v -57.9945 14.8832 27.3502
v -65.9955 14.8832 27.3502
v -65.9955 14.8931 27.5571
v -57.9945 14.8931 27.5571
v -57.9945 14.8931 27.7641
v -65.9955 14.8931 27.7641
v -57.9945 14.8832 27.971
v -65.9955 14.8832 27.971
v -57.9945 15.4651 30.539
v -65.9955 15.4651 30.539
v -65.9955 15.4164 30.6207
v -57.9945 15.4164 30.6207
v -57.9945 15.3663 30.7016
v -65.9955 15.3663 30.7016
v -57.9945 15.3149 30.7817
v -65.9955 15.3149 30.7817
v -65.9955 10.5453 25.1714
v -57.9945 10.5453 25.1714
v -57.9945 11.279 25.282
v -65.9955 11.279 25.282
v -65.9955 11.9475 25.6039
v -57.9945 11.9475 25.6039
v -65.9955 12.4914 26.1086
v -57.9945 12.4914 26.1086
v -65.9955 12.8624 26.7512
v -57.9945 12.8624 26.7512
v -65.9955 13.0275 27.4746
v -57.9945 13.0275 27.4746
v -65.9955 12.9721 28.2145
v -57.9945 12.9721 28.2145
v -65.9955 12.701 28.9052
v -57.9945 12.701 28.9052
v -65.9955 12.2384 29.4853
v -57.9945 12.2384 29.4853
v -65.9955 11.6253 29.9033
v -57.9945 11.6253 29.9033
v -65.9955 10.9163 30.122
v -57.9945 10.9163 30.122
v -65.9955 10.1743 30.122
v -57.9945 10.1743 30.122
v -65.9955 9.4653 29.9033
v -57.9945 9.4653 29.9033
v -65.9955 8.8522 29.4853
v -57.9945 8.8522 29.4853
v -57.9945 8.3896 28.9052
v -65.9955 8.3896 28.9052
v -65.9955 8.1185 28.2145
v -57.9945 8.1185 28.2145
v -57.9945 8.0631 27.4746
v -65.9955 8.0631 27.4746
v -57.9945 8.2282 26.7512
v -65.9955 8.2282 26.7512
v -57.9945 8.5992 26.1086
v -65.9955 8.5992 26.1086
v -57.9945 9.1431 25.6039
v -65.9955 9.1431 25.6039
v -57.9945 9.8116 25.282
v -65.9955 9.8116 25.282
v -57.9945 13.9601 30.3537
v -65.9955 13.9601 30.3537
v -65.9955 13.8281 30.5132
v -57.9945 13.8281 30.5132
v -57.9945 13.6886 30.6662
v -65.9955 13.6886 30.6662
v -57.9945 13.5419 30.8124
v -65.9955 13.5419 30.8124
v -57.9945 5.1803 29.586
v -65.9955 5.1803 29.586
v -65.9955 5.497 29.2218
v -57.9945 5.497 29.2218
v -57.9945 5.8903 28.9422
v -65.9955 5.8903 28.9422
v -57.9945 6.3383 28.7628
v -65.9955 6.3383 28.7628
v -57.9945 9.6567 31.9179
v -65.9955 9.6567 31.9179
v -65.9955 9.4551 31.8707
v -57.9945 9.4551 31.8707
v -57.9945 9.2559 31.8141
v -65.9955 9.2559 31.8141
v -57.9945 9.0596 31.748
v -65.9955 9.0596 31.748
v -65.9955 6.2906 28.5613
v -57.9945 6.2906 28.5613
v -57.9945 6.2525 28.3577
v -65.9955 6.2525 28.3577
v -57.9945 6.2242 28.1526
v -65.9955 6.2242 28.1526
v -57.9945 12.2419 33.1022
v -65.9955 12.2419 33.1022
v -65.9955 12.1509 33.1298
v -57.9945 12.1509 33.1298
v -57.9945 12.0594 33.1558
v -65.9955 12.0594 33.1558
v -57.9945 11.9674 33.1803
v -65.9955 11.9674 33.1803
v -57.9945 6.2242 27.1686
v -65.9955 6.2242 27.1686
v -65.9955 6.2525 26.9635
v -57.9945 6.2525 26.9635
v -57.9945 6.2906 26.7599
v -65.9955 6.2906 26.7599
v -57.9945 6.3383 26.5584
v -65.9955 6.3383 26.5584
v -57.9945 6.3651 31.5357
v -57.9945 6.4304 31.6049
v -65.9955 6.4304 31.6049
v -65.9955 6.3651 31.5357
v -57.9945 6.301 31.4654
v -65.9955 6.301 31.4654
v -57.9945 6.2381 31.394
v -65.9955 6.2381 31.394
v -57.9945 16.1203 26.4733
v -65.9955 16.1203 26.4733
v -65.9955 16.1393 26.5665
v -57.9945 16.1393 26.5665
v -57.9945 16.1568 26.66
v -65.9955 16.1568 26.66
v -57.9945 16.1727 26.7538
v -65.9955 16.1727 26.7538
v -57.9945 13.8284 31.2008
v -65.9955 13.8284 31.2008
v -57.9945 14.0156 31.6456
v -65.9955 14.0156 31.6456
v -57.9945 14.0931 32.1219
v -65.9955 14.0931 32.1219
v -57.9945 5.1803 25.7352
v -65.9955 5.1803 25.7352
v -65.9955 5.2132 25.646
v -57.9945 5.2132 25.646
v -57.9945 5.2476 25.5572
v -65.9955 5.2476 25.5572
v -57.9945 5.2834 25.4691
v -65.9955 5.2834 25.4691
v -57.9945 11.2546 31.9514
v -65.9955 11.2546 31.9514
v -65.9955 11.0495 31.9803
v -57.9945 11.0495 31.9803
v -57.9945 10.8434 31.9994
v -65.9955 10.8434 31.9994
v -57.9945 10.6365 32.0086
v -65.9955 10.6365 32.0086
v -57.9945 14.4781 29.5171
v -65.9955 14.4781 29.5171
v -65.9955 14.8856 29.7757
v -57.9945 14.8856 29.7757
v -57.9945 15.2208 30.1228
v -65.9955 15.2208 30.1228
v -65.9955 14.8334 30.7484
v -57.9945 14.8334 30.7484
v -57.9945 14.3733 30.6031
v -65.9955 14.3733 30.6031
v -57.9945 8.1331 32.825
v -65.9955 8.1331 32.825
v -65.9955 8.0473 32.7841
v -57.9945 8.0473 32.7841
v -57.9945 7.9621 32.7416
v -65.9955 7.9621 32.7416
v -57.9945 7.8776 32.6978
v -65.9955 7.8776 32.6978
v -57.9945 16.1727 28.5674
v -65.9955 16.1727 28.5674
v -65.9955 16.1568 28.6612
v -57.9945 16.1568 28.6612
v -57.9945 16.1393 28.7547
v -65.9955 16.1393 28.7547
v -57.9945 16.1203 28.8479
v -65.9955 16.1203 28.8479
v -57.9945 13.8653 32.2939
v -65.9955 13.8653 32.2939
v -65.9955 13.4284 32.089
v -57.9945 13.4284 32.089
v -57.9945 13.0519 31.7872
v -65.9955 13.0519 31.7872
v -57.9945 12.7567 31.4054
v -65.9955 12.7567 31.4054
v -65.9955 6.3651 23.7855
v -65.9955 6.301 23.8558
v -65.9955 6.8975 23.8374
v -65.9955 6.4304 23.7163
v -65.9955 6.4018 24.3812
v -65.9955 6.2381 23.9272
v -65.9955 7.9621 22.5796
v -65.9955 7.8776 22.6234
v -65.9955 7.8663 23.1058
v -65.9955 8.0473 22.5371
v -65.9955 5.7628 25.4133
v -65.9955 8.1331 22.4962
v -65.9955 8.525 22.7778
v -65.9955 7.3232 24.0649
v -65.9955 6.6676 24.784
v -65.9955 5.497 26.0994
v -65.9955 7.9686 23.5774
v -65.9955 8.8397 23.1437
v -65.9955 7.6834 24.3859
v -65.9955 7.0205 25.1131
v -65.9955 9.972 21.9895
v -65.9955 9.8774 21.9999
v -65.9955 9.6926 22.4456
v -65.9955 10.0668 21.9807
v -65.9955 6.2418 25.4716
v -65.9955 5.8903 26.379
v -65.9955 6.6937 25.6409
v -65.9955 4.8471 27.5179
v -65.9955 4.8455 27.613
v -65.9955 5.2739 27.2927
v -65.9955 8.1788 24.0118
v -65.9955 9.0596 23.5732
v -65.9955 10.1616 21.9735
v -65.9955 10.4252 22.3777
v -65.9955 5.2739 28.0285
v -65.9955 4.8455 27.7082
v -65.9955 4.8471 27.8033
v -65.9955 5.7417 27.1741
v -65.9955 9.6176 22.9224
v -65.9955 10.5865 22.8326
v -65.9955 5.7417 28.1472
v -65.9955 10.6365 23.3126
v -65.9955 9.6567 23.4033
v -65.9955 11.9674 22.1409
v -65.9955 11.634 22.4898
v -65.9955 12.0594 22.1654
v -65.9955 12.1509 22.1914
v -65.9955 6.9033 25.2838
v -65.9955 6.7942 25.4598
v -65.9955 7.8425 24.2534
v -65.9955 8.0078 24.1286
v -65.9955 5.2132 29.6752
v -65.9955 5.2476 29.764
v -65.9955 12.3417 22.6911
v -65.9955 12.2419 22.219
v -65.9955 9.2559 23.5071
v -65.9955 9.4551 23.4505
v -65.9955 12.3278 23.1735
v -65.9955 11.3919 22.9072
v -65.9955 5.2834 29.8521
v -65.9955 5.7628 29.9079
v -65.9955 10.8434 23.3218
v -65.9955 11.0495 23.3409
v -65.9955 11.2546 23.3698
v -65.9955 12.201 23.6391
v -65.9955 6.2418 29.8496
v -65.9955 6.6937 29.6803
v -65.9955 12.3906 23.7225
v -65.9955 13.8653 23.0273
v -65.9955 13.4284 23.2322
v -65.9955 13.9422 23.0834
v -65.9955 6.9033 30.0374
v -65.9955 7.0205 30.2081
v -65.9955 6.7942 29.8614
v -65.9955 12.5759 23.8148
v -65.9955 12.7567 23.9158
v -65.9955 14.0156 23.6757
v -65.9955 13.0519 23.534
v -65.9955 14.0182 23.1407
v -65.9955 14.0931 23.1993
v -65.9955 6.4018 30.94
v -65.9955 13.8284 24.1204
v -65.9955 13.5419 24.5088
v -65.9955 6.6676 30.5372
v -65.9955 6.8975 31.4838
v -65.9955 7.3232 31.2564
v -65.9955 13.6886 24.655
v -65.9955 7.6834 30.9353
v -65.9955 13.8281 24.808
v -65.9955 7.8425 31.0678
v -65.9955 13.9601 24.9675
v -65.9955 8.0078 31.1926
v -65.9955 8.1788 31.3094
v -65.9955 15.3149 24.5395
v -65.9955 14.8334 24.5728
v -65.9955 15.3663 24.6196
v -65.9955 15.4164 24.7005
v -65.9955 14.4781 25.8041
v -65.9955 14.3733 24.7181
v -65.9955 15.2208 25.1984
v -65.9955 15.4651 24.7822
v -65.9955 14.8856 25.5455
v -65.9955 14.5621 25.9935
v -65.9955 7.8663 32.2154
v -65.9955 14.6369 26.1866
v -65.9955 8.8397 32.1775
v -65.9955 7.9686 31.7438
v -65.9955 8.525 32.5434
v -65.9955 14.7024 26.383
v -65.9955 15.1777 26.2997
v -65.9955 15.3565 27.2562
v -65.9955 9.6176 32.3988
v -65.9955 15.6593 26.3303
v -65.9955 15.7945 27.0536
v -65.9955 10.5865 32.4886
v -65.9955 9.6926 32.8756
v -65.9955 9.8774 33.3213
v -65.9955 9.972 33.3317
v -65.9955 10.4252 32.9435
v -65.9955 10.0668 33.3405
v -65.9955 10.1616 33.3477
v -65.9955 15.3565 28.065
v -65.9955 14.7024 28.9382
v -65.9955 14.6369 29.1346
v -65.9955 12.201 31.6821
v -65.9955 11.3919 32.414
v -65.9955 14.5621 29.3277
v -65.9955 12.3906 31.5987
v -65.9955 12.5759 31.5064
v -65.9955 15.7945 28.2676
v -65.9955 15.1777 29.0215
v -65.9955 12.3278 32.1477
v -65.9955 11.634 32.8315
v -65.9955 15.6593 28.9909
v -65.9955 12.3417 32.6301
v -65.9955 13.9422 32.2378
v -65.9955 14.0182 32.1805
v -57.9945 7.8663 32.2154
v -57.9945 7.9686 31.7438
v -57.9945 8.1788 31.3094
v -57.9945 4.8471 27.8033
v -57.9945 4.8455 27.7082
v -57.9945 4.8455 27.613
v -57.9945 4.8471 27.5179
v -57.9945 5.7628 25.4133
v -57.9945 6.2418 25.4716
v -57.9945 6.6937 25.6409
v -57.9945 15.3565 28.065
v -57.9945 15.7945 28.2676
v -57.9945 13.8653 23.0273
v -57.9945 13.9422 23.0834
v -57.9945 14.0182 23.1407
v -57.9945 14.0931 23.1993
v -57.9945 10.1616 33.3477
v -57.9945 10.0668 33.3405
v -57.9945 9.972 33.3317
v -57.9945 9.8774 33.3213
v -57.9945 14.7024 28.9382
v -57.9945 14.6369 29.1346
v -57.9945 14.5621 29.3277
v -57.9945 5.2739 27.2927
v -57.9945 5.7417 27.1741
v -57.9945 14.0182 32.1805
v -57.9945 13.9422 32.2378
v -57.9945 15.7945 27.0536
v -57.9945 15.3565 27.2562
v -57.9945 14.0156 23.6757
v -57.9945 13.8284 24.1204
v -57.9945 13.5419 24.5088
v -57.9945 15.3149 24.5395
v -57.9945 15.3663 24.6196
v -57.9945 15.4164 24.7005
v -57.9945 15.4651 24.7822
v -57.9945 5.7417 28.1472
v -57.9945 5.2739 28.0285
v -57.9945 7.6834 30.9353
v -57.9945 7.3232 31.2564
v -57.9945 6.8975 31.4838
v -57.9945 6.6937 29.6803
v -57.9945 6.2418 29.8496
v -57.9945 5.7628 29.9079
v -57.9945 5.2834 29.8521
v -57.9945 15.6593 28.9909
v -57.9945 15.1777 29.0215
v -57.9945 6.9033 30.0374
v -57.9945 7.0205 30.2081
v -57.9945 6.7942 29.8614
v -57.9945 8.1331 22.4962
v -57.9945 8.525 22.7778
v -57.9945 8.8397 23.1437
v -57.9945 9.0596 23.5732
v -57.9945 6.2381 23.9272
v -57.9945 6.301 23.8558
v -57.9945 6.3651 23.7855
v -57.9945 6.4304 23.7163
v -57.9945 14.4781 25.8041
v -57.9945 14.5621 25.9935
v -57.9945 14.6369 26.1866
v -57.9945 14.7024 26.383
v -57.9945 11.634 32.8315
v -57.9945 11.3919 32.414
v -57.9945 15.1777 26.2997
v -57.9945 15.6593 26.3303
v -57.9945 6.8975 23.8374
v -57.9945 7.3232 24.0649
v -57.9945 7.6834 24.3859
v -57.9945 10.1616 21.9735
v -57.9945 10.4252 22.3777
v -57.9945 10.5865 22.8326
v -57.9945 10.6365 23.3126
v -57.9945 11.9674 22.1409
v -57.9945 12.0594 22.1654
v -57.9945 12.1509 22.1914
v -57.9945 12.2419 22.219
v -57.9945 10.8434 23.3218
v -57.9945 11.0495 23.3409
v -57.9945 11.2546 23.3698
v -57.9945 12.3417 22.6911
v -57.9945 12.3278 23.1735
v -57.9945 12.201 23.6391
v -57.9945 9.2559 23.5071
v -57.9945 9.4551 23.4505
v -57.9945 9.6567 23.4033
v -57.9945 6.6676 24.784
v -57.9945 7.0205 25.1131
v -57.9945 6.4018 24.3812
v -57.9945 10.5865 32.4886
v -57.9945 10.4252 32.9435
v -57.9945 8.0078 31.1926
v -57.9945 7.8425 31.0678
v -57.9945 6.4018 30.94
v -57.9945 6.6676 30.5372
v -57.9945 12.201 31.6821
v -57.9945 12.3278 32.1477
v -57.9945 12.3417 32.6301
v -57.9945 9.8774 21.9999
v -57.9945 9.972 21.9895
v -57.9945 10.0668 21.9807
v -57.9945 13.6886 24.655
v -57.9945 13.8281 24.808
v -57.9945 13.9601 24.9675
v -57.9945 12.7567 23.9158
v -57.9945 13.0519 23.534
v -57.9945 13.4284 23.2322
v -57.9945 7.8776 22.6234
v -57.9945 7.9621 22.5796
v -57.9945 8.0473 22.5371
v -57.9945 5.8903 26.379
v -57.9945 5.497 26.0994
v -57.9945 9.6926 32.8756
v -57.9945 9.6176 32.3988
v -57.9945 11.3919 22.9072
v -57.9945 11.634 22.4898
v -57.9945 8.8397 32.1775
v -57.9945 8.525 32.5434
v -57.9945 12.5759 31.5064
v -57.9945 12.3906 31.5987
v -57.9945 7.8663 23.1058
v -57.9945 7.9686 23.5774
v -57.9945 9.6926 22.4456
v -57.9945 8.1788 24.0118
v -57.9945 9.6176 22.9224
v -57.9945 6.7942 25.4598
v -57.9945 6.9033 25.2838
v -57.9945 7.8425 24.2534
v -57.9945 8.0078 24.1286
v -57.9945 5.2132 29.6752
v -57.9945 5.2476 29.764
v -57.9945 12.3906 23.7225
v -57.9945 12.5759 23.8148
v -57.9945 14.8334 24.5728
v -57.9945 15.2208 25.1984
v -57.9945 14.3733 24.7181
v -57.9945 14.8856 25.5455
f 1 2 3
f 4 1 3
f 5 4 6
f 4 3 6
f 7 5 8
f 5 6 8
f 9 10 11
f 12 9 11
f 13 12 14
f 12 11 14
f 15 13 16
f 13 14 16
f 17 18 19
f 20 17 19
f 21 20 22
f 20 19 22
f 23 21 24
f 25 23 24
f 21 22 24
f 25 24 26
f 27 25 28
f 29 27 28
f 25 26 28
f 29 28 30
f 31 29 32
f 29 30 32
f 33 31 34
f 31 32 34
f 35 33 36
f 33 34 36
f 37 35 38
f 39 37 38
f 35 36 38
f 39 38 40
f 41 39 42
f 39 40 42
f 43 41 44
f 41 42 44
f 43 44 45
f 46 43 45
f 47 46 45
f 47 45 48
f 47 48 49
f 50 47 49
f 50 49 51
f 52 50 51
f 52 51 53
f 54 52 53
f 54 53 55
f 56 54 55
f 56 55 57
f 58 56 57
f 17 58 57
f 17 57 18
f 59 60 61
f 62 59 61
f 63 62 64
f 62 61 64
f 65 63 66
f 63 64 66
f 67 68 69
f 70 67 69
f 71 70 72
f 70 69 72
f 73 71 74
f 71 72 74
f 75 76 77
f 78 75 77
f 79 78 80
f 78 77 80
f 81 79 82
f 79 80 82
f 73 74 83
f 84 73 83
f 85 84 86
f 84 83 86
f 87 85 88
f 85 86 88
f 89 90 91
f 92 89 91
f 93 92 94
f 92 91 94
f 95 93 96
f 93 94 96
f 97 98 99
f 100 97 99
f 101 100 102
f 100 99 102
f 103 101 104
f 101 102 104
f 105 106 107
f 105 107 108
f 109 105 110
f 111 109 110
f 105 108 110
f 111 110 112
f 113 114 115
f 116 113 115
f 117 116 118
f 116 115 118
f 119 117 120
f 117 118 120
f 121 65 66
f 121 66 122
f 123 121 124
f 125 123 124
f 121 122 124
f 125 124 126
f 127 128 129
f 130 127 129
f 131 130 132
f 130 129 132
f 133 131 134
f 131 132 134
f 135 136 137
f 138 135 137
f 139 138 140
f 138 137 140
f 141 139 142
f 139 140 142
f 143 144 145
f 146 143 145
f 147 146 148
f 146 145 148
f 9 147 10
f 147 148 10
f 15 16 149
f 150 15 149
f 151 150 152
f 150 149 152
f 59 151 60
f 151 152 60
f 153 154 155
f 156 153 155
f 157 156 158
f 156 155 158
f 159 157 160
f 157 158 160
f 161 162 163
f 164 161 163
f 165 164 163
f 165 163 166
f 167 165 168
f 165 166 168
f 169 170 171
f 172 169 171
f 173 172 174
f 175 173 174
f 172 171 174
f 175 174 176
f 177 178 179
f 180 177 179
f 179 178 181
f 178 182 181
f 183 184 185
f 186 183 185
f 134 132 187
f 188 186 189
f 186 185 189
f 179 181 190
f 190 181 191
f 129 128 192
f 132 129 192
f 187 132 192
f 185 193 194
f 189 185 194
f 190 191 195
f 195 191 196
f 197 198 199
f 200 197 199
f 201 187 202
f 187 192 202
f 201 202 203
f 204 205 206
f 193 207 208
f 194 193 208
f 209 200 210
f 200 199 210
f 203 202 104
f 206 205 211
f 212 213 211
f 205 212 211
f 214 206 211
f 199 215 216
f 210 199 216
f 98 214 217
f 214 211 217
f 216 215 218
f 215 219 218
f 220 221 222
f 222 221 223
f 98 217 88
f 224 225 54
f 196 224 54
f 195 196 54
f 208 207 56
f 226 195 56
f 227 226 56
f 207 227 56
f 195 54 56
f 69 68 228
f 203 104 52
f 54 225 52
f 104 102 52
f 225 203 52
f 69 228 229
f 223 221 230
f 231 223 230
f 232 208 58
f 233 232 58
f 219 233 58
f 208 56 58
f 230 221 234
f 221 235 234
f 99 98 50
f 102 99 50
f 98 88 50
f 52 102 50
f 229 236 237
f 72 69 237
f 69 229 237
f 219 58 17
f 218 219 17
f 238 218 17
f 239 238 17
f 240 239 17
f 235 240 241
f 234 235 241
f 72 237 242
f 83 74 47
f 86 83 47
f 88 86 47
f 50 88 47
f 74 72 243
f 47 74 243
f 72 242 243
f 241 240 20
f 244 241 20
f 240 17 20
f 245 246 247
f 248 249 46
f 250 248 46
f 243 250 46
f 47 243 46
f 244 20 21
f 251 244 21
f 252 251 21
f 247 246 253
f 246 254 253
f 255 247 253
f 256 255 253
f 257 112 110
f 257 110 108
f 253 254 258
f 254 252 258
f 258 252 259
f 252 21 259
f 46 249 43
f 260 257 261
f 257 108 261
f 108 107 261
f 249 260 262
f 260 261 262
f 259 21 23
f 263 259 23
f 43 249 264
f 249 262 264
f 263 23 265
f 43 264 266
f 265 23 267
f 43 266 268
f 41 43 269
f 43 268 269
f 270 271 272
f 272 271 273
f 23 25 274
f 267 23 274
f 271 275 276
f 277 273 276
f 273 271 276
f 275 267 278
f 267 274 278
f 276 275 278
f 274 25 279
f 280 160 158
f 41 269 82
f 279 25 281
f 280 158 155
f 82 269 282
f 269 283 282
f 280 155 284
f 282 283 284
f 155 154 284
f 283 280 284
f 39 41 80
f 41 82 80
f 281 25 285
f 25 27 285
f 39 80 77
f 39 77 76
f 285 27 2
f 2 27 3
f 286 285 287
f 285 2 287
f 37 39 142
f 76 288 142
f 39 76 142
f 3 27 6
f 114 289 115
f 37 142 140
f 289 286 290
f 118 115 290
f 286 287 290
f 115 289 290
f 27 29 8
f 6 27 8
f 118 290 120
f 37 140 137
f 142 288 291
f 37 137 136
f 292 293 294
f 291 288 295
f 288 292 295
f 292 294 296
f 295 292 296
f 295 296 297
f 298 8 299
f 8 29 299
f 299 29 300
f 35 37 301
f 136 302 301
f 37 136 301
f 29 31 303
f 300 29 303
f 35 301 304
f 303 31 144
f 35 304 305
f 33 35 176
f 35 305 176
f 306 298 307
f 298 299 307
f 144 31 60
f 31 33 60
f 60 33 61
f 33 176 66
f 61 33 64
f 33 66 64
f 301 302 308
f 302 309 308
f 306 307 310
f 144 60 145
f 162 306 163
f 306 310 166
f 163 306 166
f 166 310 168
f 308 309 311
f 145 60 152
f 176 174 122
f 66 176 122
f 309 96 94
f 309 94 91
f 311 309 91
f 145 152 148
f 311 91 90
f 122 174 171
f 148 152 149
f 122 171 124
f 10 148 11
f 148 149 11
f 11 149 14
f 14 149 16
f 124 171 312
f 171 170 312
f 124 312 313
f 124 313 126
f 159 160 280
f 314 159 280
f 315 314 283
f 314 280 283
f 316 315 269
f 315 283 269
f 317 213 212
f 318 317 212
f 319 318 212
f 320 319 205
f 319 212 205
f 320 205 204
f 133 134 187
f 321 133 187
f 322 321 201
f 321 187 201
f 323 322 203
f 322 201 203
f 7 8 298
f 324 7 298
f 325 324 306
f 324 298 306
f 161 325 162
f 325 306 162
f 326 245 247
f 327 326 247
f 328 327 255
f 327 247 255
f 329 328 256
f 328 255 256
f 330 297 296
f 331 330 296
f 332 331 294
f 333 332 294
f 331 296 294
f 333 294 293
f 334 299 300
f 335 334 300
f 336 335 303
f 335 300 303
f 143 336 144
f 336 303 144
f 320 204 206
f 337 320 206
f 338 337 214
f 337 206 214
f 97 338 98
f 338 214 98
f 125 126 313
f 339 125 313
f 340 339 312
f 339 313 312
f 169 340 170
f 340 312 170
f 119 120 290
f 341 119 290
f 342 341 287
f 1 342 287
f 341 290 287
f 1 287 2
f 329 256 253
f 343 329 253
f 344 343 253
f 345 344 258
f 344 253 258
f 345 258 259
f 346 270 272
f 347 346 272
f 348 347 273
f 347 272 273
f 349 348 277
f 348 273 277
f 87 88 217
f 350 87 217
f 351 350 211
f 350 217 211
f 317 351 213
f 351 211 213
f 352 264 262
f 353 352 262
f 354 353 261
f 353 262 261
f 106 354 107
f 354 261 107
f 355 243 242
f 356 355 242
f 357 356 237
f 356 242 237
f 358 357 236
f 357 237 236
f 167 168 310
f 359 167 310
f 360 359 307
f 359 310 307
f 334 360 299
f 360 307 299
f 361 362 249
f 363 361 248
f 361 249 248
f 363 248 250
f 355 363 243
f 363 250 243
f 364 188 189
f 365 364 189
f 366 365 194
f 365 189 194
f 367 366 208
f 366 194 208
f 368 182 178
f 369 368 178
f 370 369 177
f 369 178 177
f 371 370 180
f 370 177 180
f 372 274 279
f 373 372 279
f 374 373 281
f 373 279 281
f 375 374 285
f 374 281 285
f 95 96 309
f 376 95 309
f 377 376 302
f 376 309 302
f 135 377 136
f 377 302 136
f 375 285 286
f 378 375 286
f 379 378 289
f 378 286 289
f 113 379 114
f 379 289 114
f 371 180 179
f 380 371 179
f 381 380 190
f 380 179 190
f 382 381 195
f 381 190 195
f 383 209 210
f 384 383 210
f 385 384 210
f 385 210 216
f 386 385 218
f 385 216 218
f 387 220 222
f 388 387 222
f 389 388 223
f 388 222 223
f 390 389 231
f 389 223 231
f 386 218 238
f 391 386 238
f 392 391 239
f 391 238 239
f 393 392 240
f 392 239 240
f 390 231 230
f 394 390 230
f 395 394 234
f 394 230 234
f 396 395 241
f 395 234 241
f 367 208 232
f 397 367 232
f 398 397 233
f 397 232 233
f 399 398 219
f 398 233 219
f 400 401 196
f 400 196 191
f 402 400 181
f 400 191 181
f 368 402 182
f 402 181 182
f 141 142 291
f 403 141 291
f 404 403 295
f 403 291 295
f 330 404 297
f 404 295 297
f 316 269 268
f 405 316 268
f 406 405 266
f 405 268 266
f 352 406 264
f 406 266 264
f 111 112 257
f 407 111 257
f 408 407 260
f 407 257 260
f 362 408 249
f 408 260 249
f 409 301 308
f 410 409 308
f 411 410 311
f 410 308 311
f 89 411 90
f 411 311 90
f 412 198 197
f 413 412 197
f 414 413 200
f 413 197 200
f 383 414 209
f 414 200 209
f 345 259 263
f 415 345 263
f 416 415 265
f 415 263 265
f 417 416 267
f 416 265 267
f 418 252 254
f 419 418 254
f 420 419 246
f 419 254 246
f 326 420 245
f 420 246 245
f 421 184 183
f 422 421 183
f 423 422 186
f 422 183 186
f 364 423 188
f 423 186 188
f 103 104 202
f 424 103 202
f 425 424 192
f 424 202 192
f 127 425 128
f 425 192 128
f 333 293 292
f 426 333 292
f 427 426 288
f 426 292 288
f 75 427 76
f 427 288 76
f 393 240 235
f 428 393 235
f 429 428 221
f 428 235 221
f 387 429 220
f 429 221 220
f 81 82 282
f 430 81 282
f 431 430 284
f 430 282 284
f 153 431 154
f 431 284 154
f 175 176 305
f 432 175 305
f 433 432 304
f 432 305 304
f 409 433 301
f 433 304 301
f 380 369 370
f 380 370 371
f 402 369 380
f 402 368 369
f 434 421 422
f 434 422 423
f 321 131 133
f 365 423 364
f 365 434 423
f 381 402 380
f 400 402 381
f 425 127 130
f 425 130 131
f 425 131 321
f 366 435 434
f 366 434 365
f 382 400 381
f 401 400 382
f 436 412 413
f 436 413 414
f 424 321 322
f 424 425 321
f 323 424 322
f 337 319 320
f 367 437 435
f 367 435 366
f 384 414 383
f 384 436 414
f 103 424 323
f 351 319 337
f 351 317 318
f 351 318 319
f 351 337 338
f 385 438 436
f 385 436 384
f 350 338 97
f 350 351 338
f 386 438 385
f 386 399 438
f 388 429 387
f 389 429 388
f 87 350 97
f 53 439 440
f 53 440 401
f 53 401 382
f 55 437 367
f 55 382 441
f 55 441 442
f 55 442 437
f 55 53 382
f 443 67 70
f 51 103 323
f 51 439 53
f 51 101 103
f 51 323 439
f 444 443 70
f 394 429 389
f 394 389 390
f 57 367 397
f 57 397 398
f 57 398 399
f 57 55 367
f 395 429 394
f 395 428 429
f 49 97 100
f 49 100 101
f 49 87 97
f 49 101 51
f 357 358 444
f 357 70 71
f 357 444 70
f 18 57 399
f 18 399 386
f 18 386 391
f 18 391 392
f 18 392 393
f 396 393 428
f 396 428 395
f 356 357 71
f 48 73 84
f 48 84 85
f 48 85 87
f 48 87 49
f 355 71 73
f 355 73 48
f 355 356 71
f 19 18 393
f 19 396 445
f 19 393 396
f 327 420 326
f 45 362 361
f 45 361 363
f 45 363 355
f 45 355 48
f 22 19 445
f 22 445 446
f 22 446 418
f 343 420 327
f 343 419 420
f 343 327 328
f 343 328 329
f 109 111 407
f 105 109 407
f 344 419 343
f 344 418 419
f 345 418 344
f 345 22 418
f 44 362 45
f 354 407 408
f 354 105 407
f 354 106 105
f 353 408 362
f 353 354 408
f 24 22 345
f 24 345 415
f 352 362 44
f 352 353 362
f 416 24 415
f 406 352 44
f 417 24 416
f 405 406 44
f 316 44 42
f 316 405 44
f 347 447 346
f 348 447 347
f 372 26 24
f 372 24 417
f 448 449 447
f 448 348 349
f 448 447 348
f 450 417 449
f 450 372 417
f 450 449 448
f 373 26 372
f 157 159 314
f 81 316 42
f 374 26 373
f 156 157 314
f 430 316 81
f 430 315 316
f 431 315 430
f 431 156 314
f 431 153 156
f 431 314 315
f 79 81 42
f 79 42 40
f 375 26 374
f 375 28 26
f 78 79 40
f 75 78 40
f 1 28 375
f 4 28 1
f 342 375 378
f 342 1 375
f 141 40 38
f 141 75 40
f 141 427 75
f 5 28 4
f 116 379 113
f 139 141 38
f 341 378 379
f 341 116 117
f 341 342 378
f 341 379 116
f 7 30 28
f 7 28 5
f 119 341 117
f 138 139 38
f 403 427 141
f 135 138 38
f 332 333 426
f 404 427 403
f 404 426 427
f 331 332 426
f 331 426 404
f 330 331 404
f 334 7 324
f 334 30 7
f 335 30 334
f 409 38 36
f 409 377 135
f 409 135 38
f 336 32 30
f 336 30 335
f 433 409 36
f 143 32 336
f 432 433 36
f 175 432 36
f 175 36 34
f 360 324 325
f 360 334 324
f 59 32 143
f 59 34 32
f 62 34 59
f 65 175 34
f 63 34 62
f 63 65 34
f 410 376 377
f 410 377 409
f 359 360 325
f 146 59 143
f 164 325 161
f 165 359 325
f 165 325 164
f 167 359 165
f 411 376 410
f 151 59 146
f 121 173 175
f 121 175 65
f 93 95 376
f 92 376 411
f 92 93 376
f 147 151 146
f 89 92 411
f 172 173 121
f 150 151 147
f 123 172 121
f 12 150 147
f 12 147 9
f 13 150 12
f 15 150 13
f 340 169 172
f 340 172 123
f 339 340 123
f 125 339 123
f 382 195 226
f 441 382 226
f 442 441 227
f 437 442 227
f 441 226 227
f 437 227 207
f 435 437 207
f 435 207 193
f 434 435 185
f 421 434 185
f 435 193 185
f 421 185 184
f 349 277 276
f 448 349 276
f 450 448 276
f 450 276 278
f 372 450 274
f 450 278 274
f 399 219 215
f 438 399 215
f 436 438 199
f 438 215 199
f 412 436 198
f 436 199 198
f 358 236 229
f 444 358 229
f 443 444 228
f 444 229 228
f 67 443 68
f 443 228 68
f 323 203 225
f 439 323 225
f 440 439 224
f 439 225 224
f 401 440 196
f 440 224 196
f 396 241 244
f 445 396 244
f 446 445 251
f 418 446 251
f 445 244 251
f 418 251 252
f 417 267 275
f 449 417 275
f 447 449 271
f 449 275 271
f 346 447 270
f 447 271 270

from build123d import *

# Parameters (mm, degrees)
SPUR_START             = -65.99548243
SPUR_GEAR_AM_OUTLINE_R = 2
SPUR_GEAR_AM_DEPTH     = 8.001
SKETCH1_R              = 2.4892
CUT_EXTRUDE1_DEPTH     = 38.916221237


# Read off the part's stored shape, not the designer's step: spur gear_am
with BuildPart() as part:
    # spur gear_am outline → spur gear_am (new body)
    with BuildSketch(Plane.YZ.offset(SPUR_START)):
        with BuildLine():
            ThreePointArc((15.314879055, 24.539540588), (15.391528072, 24.659938624), (15.465138567, 24.782218033))
            ThreePointArc((15.465138567, 24.782218033), (15.063480167, 25.38187856), (14.478147109, 25.804143203))
            ThreePointArc((14.478147109, 25.804143203), (14.600612124, 26.089561946), (14.70239475, 26.38299309))
            ThreePointArc((14.70239475, 26.38299309), (15.41943895, 26.300714095), (16.120256774, 26.473273058))
            ThreePointArc((16.120256774, 26.473273058), (16.148237066, 26.613229702), (16.172704392, 26.753843033))
            ThreePointArc((16.172704392, 26.753843033), (15.58154672, 27.167914071), (14.883200315, 27.350217435))
            ThreePointArc((14.883200315, 27.350217435), (14.894290398, 27.660601953), (14.883200315, 27.970986471))
            ThreePointArc((14.883200315, 27.970986471), (15.58154672, 28.153289835), (16.172704392, 28.567360874))
            ThreePointArc((16.172704392, 28.567360874), (16.148237066, 28.707974205), (16.120256774, 28.847930848))
            ThreePointArc((16.120256774, 28.847930848), (15.41943895, 29.020489811), (14.70239475, 28.938210816))
            ThreePointArc((14.70239475, 28.938210816), (14.600612124, 29.23164196), (14.478147109, 29.517060703))
            ThreePointArc((14.478147109, 29.517060703), (15.063480167, 29.939325346), (15.465138567, 30.538985873))
            ThreePointArc((15.465138567, 30.538985873), (15.391528072, 30.661265282), (15.314879055, 30.781663318))
            ThreePointArc((15.314879055, 30.781663318), (14.599050409, 30.68940516), (13.960149206, 30.35365604))
            ThreePointArc((13.960149206, 30.35365604), (13.759240179, 30.590504307), (13.541939811, 30.812409893))
            ThreePointArc((13.541939811, 30.812409893), (13.93520705, 31.417606636), (14.093119986, 32.121869174))
            ThreePointArc((14.093119986, 32.121869174), (13.980307826, 32.209300149), (13.865341959, 32.293879155))
            ThreePointArc((13.865341959, 32.293879155), (13.231179117, 31.949263852), (12.756708059, 31.405389388))
            ThreePointArc((12.756708059, 31.405389388), (12.483806507, 31.553667107), (12.201018405, 31.682089957))
            ThreePointArc((12.201018405, 31.682089957), (12.349106905, 32.388483625), (12.241947359, 33.102233616))
            ThreePointArc((12.241947359, 33.102233616), (12.105169441, 33.143008119), (11.967413502, 33.180345233))
            ThreePointArc((11.967413502, 33.180345233), (11.500563669, 32.629914991), (11.254602702, 31.951368441))
            ThreePointArc((11.254602702, 31.951368441), (10.946565493, 31.991049886), (10.636481757, 32.008645782))
            ThreePointArc((10.636481757, 32.008645782), (10.519391345, 32.720833997), (10.161631808, 33.347675549))
            ThreePointArc((10.161631808, 33.347675549), (10.019360749, 33.336286758), (9.87741944, 33.321339395))
            ThreePointArc((9.87741944, 33.321339395), (9.640933273, 32.639432869), (9.656700788, 31.917855705))
            ThreePointArc((9.656700788, 31.917855705), (9.355130054, 31.843581675), (9.059629211, 31.747974194))
            ThreePointArc((9.059629211, 31.747974194), (8.693173595, 32.369771991), (8.133131476, 32.82504668))
            ThreePointArc((8.133131476, 32.82504668), (8.00458177, 32.763032714), (7.877625051, 32.697819598))
            ThreePointArc((7.877625051, 32.697819598), (7.903441318, 31.976532042), (8.178807825, 31.309377259))
            ThreePointArc((8.178807825, 31.309377259), (7.924432364, 31.131178875), (7.68342344, 30.935280336))
            ThreePointArc((7.68342344, 30.935280336), (7.117094483, 31.382710477), (6.430406572, 31.604930933))
            ThreePointArc((6.430406572, 31.604930933), (6.33293957, 31.500667122), (6.23811365, 31.393995646))
            ThreePointArc((6.23811365, 31.393995646), (6.52274572, 30.730740941), (7.020521446, 30.208111489))
            ThreePointArc((7.020521446, 30.208111489), (6.847696075, 29.950055429), (6.69372866, 29.680323017))
            ThreePointArc((6.69372866, 29.680323017), (6.004012226, 29.892957582), (5.283419531, 29.852111701))
            ThreePointArc((5.283419531, 29.852111701), (5.23019869, 29.71967945), (5.180310335, 29.585956188))
            ThreePointArc((5.180310335, 29.585956188), (5.685317071, 29.070310558), (6.338274646, 28.76279044))
            ThreePointArc((6.338274646, 28.76279044), (6.270340387, 28.459728606), (6.224208635, 28.152591177))
            ThreePointArc((6.224208635, 28.152591177), (5.504254749, 28.10171269), (4.847077307, 27.803316934))
            ThreePointArc((4.847077307, 27.803316934), (4.845290398, 27.660601953), (4.847077307, 27.517886972))
            ThreePointArc((4.847077307, 27.517886972), (5.504254749, 27.219491216), (6.224208635, 27.168612729))
            ThreePointArc((6.224208635, 27.168612729), (6.270340387, 26.8614753), (6.338274646, 26.558413466))
            ThreePointArc((6.338274646, 26.558413466), (5.685317071, 26.250893348), (5.180310335, 25.735247718))
            ThreePointArc((5.180310335, 25.735247718), (5.23019869, 25.601524456), (5.283419531, 25.469092205))
            ThreePointArc((5.283419531, 25.469092205), (6.004012226, 25.428246324), (6.69372866, 25.640880889))
            ThreePointArc((6.69372866, 25.640880889), (6.847696075, 25.371148477), (7.020521446, 25.113092417))
            ThreePointArc((7.020521446, 25.113092417), (6.52274572, 24.590462965), (6.23811365, 23.927208261))
            ThreePointArc((6.23811365, 23.927208261), (6.33293957, 23.820536784), (6.430406572, 23.716272973))
            ThreePointArc((6.430406572, 23.716272973), (7.117094483, 23.938493429), (7.68342344, 24.38592357))
            ThreePointArc((7.68342344, 24.38592357), (7.924432364, 24.190025032), (8.178807825, 24.011826648))
            ThreePointArc((8.178807825, 24.011826648), (7.903441318, 23.344671864), (7.877625051, 22.623384308))
            ThreePointArc((7.877625051, 22.623384308), (8.00458177, 22.558171192), (8.133131476, 22.496157226))
            ThreePointArc((8.133131476, 22.496157226), (8.693173595, 22.951431915), (9.059629211, 23.573229712))
            ThreePointArc((9.059629211, 23.573229712), (9.355130054, 23.477622231), (9.656700788, 23.403348202))
            ThreePointArc((9.656700788, 23.403348202), (9.640933273, 22.681771038), (9.87741944, 21.999864511))
            ThreePointArc((9.87741944, 21.999864511), (10.019360749, 21.984917148), (10.161631808, 21.973528357))
            ThreePointArc((10.161631808, 21.973528357), (10.519391345, 22.600369909), (10.636481757, 23.312558124))
            ThreePointArc((10.636481757, 23.312558124), (10.946565493, 23.33015402), (11.254602702, 23.369835465))
            ThreePointArc((11.254602702, 23.369835465), (11.500563669, 22.691288915), (11.967413502, 22.140858673))
            ThreePointArc((11.967413502, 22.140858673), (12.105169441, 22.178195787), (12.241947359, 22.21897029))
            ThreePointArc((12.241947359, 22.21897029), (12.349106905, 22.932720281), (12.201018405, 23.639113949))
            ThreePointArc((12.201018405, 23.639113949), (12.483806507, 23.767536799), (12.756708059, 23.915814519))
            ThreePointArc((12.756708059, 23.915814519), (13.231179116, 23.371940054), (13.865341959, 23.027324751))
            ThreePointArc((13.865341959, 23.027324751), (13.980307825, 23.111903758), (14.093119986, 23.199334732))
            ThreePointArc((14.093119986, 23.199334732), (13.93520705, 23.90359727), (13.541939811, 24.508794013))
            ThreePointArc((13.541939811, 24.508794013), (13.759240179, 24.730699599), (13.960149206, 24.967547866))
            ThreePointArc((13.960149206, 24.967547866), (14.599050409, 24.631798746), (15.314879055, 24.539540588))
        make_face()
        with Locations((10.545290398, 27.660601953)):
            Circle(SPUR_GEAR_AM_OUTLINE_R, mode=Mode.SUBTRACT)
    extrude(amount=SPUR_GEAR_AM_DEPTH)

    # Sketch1 → Cut-Extrude1 (cut, through all)
    with BuildSketch(Plane(origin=(-57.99448243, 0, 0), x_dir=(0, 0, -1), z_dir=(1, 0, 0))):
        with Locations((-27.660601953, 10.545290398)):
            Circle(SKETCH1_R)
    extrude(amount=-CUT_EXTRUDE1_DEPTH, mode=Mode.SUBTRACT)


solid = part.part
